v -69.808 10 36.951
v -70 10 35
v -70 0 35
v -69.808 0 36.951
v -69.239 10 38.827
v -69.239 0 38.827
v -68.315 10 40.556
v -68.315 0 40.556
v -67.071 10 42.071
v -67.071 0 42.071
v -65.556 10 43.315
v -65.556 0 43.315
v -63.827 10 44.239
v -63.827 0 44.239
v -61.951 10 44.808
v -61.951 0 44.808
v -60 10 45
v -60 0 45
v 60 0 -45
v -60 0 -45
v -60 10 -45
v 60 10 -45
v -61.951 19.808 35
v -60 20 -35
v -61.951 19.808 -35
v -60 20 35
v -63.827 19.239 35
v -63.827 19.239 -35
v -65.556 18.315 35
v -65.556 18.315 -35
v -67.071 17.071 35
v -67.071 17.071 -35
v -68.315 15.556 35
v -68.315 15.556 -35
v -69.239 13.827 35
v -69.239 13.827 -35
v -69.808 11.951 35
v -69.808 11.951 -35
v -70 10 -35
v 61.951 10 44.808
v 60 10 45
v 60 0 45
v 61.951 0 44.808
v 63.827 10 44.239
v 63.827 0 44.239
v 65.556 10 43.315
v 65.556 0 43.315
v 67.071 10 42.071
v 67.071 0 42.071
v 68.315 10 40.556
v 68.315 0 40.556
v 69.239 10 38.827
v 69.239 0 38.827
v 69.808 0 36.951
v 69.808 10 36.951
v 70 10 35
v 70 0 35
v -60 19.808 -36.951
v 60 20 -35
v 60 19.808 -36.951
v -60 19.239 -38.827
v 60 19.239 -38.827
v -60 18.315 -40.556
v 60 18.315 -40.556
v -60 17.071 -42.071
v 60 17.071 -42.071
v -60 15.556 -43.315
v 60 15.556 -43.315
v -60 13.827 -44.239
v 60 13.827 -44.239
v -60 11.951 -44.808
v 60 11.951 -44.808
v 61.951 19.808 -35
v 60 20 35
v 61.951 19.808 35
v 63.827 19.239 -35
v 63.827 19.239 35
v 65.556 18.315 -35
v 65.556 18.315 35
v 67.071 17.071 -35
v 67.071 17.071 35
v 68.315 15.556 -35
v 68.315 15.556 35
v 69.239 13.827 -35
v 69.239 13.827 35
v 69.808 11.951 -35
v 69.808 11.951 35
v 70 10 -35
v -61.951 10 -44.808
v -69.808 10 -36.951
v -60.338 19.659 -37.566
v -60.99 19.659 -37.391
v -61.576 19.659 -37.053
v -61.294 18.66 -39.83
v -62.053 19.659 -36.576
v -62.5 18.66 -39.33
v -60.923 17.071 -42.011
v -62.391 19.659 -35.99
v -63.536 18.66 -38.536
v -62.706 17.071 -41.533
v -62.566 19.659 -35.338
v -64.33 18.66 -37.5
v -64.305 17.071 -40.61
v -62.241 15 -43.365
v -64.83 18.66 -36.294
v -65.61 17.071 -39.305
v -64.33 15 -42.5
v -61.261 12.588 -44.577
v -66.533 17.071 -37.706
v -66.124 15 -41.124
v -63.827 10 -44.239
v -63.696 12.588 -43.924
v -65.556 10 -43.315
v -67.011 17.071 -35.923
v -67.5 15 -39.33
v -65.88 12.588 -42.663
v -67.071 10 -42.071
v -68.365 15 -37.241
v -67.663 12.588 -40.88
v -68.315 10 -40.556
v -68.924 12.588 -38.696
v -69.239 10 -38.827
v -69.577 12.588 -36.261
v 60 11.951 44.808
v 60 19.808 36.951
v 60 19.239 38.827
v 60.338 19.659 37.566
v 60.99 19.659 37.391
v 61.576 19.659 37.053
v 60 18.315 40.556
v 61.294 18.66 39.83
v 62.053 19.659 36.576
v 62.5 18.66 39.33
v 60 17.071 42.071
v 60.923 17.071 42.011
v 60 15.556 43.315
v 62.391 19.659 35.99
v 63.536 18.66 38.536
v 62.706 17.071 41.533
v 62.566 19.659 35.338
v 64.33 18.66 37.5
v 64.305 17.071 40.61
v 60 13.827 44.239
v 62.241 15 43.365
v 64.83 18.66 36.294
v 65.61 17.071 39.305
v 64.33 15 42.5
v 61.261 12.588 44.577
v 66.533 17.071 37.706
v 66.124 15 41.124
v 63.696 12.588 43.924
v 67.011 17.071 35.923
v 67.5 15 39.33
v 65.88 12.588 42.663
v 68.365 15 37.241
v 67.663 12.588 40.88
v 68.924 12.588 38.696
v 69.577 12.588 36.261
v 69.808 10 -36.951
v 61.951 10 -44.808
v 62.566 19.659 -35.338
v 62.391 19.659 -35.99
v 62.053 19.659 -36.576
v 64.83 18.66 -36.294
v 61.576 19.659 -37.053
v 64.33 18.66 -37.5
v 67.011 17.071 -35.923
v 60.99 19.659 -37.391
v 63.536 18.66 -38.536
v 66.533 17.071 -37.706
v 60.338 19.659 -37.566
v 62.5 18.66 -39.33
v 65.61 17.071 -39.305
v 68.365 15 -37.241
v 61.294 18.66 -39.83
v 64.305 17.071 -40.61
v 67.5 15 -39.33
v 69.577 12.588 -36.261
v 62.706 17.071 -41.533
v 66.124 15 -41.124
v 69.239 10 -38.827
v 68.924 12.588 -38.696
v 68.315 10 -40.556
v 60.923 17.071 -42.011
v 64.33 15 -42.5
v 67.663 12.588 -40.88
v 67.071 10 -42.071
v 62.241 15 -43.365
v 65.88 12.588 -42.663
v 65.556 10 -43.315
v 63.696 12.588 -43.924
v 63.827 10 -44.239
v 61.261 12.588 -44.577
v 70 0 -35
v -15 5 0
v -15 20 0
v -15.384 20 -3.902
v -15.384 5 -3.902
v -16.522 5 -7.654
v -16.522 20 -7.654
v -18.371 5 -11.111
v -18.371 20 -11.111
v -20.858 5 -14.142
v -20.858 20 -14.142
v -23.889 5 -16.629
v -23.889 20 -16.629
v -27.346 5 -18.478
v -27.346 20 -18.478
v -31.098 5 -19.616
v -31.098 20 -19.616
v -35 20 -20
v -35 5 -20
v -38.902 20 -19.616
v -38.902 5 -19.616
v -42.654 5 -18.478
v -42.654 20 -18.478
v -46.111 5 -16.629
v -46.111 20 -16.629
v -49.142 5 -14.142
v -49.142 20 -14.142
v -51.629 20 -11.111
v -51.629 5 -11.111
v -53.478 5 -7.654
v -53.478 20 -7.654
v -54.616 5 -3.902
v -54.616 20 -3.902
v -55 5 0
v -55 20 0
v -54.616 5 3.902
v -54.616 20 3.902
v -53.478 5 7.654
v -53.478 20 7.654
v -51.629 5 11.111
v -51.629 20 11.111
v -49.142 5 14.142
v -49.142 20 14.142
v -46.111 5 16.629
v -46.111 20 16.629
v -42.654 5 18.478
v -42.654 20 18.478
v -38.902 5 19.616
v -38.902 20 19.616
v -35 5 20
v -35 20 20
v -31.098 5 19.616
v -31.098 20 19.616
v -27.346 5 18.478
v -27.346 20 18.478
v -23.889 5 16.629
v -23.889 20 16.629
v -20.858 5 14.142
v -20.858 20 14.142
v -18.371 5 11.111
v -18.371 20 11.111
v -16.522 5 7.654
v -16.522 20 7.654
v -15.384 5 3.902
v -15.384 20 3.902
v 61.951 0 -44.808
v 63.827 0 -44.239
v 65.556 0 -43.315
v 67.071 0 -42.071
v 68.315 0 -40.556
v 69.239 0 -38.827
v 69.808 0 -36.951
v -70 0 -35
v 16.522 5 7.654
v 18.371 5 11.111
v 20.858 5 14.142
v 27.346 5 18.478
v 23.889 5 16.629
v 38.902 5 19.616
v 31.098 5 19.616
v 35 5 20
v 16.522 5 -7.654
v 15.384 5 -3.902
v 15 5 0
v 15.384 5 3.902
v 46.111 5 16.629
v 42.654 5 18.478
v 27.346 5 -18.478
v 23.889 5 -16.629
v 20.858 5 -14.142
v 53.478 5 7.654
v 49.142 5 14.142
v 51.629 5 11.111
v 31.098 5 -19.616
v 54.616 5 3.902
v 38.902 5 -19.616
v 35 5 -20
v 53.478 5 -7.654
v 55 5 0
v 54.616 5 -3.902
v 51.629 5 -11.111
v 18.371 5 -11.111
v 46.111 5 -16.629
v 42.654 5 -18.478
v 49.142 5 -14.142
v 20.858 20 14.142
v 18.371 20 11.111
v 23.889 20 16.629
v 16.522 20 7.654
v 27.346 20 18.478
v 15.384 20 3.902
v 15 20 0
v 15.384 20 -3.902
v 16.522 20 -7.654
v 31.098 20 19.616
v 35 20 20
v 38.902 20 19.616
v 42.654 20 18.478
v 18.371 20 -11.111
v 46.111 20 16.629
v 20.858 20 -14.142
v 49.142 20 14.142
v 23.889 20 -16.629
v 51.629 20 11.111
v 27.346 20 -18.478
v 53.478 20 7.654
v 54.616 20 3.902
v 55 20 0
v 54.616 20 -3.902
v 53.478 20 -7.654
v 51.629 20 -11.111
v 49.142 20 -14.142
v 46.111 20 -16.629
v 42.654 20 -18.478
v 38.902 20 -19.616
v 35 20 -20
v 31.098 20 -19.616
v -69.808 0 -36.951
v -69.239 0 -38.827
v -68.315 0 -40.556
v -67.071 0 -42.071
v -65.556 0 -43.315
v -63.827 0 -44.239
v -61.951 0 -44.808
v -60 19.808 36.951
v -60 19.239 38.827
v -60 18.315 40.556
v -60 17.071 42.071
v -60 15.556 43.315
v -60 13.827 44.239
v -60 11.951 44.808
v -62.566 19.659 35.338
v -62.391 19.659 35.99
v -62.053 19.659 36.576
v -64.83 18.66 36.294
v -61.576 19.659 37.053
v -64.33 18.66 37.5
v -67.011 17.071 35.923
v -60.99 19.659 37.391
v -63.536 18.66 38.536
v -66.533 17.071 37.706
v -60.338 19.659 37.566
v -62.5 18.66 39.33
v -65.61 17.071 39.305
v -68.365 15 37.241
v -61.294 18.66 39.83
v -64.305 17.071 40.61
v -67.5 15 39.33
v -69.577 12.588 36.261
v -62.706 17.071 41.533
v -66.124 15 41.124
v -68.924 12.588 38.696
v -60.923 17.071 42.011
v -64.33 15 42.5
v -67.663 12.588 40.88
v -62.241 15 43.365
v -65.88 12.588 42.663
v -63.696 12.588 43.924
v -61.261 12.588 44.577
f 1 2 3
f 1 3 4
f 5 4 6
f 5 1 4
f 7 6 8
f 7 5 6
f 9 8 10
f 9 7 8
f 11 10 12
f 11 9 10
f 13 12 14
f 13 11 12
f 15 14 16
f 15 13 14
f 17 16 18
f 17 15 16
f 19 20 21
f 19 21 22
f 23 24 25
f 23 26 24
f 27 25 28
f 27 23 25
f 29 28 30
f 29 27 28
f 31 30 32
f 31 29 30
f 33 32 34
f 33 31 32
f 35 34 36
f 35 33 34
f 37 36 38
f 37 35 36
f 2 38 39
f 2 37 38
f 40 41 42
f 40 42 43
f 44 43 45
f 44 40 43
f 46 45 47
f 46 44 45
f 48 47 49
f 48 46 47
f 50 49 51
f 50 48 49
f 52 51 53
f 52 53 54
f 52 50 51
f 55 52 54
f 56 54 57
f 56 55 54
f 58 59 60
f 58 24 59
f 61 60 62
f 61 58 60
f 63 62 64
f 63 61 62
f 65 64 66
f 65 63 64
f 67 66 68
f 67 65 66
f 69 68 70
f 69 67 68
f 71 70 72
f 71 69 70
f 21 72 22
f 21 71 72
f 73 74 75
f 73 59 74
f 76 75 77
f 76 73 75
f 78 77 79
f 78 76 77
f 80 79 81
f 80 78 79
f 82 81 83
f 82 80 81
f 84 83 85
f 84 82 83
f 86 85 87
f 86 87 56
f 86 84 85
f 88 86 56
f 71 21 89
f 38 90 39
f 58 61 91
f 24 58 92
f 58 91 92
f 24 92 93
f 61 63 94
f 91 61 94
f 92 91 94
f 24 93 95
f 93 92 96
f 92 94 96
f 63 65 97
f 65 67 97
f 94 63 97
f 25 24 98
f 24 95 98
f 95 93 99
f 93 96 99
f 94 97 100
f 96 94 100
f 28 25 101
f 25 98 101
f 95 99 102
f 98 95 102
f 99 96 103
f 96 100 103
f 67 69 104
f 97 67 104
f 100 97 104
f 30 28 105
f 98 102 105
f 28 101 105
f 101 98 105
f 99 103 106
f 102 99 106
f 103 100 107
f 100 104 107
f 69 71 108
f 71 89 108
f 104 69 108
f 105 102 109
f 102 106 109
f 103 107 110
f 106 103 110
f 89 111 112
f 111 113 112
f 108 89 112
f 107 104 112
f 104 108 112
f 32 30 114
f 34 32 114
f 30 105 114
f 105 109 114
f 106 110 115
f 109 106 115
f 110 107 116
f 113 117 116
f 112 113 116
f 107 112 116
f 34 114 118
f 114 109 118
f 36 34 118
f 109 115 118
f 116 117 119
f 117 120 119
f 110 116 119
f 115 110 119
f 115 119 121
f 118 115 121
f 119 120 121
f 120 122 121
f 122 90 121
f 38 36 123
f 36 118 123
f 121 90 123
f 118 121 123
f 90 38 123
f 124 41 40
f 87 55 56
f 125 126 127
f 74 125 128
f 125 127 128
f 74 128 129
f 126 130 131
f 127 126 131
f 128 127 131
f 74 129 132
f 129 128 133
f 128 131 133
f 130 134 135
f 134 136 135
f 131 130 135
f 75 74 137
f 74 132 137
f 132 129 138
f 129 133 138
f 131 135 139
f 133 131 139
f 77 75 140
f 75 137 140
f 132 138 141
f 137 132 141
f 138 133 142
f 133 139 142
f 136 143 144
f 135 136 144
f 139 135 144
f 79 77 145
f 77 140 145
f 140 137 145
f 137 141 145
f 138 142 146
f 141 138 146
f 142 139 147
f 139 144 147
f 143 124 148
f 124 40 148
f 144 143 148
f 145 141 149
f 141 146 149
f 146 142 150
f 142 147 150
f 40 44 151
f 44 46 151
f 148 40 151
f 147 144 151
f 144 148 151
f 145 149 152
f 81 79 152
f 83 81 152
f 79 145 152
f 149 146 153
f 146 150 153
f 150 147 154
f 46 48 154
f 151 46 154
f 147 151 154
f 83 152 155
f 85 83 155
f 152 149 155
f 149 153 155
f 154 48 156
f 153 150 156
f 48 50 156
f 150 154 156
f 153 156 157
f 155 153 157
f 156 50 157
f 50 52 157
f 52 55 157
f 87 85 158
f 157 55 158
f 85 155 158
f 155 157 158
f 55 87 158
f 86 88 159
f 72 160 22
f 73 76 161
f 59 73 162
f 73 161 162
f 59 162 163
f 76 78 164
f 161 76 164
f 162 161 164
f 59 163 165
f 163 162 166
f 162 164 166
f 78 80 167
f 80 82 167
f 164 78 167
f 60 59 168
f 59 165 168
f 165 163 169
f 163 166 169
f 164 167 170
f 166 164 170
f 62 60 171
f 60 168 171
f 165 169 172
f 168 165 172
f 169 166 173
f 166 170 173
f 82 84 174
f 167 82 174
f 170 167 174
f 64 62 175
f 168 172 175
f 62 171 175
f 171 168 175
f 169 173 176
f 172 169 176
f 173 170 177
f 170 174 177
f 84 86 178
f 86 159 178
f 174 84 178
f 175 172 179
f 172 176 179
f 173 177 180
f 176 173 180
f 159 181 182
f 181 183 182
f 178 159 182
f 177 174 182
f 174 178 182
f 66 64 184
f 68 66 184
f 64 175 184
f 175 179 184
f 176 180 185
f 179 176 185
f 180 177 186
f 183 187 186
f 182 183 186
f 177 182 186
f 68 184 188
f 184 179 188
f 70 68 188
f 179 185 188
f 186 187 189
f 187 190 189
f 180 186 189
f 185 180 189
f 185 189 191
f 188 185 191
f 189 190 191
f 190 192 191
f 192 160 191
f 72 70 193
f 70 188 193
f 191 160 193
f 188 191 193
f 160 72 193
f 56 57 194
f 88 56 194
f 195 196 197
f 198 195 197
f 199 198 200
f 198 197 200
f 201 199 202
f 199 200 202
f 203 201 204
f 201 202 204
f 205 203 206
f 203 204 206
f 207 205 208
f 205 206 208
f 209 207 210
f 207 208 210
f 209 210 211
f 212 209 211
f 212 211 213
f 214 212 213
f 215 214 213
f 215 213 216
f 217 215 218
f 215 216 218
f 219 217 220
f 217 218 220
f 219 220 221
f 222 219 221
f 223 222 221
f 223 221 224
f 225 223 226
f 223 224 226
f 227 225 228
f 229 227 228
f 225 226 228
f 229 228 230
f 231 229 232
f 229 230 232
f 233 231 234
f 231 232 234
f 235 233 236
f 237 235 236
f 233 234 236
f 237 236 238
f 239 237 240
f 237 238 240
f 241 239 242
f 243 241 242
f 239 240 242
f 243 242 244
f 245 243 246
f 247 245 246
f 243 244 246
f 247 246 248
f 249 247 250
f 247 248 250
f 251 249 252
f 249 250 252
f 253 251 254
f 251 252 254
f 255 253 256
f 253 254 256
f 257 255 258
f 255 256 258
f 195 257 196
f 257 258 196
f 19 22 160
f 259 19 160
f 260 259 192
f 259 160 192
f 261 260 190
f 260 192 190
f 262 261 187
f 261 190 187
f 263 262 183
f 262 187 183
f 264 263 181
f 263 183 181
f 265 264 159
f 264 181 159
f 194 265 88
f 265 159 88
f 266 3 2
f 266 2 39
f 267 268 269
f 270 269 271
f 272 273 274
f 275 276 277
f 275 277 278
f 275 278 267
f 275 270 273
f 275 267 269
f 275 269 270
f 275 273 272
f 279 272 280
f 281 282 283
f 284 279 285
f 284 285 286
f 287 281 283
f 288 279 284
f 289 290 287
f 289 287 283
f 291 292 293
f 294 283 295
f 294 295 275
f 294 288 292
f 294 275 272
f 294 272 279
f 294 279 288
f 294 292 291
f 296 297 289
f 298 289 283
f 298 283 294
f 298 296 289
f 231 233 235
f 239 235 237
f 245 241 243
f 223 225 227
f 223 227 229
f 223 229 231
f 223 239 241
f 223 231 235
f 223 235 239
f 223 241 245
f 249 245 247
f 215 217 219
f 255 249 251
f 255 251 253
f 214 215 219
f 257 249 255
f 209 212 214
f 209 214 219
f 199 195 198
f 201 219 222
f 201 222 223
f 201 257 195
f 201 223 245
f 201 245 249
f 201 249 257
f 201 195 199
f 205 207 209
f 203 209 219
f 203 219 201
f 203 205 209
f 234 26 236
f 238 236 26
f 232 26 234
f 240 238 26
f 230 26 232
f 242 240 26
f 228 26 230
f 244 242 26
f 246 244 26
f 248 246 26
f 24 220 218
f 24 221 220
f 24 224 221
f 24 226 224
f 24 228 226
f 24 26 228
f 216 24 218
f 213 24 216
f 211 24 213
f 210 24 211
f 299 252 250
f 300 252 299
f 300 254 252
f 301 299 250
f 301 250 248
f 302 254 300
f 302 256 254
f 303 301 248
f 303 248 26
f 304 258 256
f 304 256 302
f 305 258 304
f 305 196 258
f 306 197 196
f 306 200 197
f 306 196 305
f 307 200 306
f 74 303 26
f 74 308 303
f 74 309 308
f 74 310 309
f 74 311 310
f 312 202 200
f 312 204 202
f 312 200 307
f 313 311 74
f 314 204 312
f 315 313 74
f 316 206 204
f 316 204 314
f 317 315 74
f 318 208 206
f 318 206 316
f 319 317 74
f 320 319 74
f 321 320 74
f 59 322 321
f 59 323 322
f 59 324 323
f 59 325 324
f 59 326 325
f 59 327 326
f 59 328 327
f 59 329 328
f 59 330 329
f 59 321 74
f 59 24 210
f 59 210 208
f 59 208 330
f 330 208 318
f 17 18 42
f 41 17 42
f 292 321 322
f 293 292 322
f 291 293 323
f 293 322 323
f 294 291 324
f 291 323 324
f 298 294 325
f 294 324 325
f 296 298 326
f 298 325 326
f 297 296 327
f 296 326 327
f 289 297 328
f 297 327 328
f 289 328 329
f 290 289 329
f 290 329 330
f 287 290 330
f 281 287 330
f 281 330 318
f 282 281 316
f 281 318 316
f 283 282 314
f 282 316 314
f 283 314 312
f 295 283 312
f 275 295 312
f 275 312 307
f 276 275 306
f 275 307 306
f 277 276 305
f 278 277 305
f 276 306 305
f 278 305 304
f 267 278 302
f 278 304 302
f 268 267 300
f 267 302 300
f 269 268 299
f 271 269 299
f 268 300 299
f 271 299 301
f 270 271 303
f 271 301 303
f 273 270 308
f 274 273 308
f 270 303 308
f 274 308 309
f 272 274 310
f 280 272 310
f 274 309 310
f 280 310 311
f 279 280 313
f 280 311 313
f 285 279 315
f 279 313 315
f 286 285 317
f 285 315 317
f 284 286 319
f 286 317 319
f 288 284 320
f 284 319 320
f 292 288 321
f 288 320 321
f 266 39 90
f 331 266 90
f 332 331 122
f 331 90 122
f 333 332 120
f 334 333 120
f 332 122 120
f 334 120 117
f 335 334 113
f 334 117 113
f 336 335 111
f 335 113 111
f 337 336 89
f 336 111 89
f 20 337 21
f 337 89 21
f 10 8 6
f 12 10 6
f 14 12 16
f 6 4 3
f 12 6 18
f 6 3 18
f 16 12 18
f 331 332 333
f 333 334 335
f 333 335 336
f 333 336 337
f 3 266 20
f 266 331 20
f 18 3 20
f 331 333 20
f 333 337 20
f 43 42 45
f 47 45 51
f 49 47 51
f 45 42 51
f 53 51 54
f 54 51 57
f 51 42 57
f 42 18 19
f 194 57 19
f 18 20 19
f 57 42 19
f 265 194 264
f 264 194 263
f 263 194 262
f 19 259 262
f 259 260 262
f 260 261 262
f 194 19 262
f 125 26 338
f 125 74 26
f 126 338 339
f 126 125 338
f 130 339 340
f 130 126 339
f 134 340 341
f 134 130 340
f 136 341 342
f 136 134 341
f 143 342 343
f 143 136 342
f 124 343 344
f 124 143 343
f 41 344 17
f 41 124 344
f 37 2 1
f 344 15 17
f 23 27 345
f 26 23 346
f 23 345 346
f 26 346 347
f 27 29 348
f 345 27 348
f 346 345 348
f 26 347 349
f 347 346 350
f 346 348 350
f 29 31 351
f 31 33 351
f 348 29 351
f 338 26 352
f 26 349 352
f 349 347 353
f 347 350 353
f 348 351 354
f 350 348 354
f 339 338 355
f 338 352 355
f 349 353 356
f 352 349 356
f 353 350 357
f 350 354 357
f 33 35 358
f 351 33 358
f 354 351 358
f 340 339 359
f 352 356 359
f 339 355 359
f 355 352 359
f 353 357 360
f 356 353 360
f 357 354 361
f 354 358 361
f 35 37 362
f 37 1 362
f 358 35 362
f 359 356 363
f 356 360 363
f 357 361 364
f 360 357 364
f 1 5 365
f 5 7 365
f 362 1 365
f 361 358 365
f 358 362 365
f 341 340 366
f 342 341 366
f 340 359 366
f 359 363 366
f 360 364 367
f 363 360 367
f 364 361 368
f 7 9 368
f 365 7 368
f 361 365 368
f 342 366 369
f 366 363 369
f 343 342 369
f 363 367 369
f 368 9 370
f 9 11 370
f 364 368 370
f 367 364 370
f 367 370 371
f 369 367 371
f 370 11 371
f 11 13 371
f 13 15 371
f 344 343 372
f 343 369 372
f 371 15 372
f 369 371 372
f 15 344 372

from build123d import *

# Parameters (mm, degrees)
SKETCH1_W           = 140
SKETCH1_H           = 90
BOSS_EXTRUDE1_DEPTH = 20
SKETCH2_R           = 20
CUT_EXTRUDE1_DEPTH  = 15
FILLET1_R           = 10
FILLET2_R           = 10


with BuildPart() as part:
    # Sketch1 → Boss-Extrude1 (new body)
    with BuildSketch(Plane(origin=(0, 0, 0), x_dir=(1, 0, 0), z_dir=(0, 1, 0))):
        Rectangle(SKETCH1_W, SKETCH1_H)
    extrude(amount=BOSS_EXTRUDE1_DEPTH)

    # Sketch2 → Cut-Extrude1 (cut)
    with BuildSketch(Plane(origin=(0, 20, 0), x_dir=(1, 0, 0), z_dir=(0, 1, 0))):
        with Locations((-35, 0)):
            Circle(SKETCH2_R)
        with Locations((35, 0)):
            Circle(SKETCH2_R)
    extrude(amount=-CUT_EXTRUDE1_DEPTH, mode=Mode.SUBTRACT)

    # Fillet1
    fillet1_edges = [part.edges().sort_by_distance(p)[0] for p in [
        (-70, 10, -45),
        (70, 10, -45),
        (70, 10, 45),
        (-70, 10, 45),
    ]]
    fillet(fillet1_edges, radius=FILLET1_R)

    # Fillet2
    fillet2_edges = [part.edges().sort_by_distance(p)[0] for p in [
        (70, 20, 0),
        (0, 20, 45),
        (-70, 20, 0),
        (0, 20, -45),
        (-67.071067812, 20, 42.071067812),
        (-67.071067812, 20, -42.071067812),
        (67.071067812, 20, -42.071067812),
        (67.071067812, 20, 42.071067812),
    ]]
    fillet(fillet2_edges, radius=FILLET2_R)


solid = part.part
